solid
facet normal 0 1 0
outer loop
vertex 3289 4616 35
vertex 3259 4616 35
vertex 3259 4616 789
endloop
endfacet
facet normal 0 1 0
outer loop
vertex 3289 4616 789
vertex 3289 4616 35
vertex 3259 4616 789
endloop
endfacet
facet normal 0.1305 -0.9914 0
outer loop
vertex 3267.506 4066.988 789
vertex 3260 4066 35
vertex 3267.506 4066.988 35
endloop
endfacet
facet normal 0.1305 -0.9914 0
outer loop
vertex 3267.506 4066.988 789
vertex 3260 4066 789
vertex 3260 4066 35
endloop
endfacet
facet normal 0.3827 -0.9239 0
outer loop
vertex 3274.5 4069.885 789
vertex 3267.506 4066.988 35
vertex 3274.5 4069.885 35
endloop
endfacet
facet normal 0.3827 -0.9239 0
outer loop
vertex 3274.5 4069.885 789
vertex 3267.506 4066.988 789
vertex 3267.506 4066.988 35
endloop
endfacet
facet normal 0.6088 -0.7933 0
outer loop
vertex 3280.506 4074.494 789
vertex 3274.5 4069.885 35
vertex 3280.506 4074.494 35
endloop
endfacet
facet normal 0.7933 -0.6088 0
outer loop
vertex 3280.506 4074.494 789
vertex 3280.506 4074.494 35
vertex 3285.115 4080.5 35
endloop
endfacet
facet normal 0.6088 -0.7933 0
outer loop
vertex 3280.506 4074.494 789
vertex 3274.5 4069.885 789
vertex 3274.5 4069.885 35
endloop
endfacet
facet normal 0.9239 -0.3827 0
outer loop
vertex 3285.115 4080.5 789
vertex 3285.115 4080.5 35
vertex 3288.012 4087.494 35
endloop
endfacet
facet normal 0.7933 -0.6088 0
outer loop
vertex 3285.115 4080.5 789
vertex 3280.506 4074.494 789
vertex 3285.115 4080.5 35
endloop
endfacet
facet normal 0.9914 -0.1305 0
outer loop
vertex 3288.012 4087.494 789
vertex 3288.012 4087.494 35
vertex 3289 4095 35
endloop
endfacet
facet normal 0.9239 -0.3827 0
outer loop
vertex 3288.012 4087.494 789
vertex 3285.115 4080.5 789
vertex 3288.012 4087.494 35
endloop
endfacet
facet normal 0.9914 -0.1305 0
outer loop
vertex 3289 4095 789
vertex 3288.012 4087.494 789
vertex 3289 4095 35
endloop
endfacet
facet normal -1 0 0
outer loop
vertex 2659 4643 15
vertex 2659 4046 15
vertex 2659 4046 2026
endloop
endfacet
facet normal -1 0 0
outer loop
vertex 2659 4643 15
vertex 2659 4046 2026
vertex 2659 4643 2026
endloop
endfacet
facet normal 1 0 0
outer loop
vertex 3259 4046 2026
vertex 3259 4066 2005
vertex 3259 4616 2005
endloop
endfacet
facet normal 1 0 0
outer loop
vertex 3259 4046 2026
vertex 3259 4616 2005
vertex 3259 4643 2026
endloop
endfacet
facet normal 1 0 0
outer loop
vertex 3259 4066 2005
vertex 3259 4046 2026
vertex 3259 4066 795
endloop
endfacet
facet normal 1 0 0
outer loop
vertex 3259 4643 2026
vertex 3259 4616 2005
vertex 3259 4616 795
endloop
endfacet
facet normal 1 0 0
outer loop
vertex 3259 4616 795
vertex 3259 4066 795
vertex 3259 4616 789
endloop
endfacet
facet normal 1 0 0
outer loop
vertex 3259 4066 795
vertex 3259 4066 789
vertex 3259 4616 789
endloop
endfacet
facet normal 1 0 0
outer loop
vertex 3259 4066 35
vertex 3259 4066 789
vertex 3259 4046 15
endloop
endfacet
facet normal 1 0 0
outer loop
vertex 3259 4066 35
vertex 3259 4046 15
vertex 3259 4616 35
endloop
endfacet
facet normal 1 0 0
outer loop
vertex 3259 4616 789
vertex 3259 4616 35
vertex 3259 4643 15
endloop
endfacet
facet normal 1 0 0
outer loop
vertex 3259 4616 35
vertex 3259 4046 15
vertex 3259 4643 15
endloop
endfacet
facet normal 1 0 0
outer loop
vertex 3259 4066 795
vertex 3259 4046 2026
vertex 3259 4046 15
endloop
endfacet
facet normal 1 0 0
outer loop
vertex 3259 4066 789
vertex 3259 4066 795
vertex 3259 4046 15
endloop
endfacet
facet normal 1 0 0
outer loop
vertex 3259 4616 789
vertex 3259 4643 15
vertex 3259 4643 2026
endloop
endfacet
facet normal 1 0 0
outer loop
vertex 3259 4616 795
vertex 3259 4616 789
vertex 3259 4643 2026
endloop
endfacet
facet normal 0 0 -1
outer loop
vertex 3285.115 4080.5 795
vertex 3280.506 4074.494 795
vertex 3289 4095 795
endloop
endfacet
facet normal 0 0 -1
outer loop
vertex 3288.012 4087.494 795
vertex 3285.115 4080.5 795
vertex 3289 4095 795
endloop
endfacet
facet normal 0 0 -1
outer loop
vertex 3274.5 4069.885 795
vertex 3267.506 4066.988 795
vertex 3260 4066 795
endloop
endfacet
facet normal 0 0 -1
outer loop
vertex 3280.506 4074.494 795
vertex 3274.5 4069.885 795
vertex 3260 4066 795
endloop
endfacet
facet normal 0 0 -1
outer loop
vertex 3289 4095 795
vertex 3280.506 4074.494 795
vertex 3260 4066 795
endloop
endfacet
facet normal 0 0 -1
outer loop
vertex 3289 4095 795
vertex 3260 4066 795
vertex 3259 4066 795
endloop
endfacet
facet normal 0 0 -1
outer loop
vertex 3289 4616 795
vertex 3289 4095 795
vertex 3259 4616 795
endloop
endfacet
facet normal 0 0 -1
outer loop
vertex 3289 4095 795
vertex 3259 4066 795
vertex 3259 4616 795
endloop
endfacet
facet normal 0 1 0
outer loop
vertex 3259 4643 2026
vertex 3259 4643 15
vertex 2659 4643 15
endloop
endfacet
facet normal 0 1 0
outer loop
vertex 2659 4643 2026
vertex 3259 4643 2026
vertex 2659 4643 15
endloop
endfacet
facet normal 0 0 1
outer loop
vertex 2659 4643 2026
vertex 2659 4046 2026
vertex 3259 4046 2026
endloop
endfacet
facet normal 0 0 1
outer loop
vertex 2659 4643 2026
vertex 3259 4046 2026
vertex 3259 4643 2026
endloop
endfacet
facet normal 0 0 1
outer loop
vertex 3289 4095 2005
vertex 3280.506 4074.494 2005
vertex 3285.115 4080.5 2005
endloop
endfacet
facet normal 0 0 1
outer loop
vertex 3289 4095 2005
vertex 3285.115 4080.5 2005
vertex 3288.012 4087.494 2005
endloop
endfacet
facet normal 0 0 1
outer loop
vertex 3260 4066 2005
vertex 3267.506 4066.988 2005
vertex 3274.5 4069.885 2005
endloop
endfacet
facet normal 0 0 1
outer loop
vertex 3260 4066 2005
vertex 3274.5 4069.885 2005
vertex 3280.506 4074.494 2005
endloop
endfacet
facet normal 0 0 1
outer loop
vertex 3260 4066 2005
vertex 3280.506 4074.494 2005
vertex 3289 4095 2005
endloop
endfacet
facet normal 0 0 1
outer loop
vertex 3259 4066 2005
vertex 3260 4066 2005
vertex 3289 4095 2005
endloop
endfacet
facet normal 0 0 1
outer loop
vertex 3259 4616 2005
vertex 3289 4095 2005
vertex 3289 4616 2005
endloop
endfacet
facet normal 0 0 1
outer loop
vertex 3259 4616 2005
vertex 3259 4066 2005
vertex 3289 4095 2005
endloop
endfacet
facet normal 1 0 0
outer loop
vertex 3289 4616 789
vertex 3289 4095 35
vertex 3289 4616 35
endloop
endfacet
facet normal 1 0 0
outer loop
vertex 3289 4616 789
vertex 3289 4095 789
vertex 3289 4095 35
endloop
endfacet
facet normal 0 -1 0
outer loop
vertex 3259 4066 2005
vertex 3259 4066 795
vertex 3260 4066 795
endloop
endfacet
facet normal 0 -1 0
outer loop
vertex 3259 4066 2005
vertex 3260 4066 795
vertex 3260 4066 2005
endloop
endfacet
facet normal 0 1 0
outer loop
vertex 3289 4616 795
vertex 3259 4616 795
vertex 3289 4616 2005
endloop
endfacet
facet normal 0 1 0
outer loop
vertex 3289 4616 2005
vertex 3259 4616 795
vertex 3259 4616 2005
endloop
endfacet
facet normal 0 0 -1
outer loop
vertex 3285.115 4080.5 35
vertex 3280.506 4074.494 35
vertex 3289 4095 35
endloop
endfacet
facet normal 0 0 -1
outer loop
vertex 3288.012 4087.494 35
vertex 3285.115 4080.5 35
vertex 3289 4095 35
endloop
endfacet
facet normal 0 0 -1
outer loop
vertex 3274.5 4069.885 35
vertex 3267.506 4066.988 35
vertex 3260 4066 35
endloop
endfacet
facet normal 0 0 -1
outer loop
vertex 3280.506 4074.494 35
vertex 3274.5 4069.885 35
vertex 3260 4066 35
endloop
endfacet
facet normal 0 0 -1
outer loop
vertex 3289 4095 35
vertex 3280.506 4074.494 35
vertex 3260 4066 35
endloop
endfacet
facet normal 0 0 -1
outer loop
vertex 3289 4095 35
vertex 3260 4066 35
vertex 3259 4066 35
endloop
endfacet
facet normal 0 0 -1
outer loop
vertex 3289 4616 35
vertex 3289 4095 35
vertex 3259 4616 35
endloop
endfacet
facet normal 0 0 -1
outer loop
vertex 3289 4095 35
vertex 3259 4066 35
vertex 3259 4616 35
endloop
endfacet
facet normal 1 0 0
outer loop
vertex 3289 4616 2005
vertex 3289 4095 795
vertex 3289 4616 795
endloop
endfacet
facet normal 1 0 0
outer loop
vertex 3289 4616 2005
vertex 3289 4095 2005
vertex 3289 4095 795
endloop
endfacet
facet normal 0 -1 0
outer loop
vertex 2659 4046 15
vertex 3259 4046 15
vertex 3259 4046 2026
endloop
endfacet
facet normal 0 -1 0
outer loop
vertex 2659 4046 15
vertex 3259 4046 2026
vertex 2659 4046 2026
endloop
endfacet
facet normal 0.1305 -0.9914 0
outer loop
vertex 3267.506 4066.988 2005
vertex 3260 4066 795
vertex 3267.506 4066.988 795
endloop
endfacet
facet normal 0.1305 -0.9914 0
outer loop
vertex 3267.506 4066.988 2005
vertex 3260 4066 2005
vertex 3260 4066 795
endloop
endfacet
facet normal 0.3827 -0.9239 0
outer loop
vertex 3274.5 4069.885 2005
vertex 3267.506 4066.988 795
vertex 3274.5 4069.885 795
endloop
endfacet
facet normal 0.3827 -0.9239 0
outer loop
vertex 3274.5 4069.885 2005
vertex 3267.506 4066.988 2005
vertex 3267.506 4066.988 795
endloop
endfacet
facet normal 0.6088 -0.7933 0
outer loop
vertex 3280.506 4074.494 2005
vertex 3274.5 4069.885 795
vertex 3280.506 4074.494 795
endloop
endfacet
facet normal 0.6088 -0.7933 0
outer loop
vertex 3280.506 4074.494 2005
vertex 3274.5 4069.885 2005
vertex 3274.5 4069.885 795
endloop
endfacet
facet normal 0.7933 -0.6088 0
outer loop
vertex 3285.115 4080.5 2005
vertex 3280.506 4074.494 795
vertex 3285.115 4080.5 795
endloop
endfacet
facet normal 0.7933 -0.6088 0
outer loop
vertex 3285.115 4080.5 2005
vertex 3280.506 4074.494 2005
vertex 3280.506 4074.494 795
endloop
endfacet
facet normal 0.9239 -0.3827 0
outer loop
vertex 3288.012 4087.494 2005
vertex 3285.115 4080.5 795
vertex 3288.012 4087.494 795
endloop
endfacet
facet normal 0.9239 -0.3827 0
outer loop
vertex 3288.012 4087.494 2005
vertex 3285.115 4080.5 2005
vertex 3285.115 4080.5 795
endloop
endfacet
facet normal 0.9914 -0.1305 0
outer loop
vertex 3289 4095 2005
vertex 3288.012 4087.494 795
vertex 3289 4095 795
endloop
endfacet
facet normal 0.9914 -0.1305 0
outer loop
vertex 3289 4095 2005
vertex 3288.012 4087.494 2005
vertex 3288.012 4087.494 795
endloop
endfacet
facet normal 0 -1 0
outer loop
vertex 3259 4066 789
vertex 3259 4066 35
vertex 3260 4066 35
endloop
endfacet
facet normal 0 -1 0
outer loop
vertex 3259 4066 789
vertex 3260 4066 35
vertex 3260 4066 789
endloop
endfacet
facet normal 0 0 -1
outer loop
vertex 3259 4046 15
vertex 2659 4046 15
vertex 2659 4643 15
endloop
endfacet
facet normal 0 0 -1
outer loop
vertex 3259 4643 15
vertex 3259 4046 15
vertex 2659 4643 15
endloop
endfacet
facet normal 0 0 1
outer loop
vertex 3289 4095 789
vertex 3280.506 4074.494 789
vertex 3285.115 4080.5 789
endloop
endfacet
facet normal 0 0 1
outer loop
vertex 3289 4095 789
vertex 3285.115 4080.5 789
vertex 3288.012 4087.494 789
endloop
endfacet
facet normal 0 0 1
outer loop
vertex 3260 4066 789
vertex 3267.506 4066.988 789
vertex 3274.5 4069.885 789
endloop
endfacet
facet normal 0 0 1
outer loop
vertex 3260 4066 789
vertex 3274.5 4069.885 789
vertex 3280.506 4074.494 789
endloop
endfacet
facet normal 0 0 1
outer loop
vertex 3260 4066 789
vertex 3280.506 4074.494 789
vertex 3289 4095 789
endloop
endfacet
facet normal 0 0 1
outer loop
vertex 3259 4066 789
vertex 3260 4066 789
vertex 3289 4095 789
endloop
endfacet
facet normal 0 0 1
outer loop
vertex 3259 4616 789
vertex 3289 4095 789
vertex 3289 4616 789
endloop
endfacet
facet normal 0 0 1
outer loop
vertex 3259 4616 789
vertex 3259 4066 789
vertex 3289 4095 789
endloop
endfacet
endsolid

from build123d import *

# Parameters (mm, degrees)
SKETCH627_W             = 597
SKETCH627_H             = 600
PAD300_DEPTH            = 2011
SKETCH628_W             = 550
SKETCH628_H             = 1210
PAD301_DEPTH            = 30
FILLET211_R             = 29
SKETCH629_W             = 550
SKETCH629_H             = 754
PAD302_DEPTH            = 30
FILLET212_R             = 29
BODY127_PLACEMENT_ANGLE = 90


with BuildPart() as part:
    # Sketch627 → Pad300 (new body)
    with BuildSketch(Plane.XY):
        with Locations((298.5, 300)):
            Rectangle(SKETCH627_W, SKETCH627_H)
    extrude(amount=PAD300_DEPTH)

    # Sketch628 (on Face1 of Pad300) → Pad301 (join)
    with BuildSketch(Plane.XZ):
        with Locations((295, 1385)):
            Rectangle(SKETCH628_W, SKETCH628_H)
    extrude(amount=PAD301_DEPTH)

    # Fillet211
    fillet211_edges = [part.edges().sort_by_distance(p)[0] for p in [
        (20, -30, 1385),
    ]]
    fillet(fillet211_edges, radius=FILLET211_R)

    # Sketch629 (on Face4 of Fillet211) → Pad302 (join)
    with BuildSketch(Plane.XZ):
        with Locations((295, 397)):
            Rectangle(SKETCH629_W, SKETCH629_H)
    extrude(amount=PAD302_DEPTH)

    # Fillet212
    fillet212_edges = [part.edges().sort_by_distance(p)[0] for p in [
        (20, -30, 397),
    ]]
    fillet(fillet212_edges, radius=FILLET212_R)


with BuildPart() as part_1:
    # Body127 placement: moved
    add(part.part.moved(Location((3259, 4046, 15))).rotate(Axis((3259, 4046, 15), (0, 0, 1)), BODY127_PLACEMENT_ANGLE))


solid = part_1.part
